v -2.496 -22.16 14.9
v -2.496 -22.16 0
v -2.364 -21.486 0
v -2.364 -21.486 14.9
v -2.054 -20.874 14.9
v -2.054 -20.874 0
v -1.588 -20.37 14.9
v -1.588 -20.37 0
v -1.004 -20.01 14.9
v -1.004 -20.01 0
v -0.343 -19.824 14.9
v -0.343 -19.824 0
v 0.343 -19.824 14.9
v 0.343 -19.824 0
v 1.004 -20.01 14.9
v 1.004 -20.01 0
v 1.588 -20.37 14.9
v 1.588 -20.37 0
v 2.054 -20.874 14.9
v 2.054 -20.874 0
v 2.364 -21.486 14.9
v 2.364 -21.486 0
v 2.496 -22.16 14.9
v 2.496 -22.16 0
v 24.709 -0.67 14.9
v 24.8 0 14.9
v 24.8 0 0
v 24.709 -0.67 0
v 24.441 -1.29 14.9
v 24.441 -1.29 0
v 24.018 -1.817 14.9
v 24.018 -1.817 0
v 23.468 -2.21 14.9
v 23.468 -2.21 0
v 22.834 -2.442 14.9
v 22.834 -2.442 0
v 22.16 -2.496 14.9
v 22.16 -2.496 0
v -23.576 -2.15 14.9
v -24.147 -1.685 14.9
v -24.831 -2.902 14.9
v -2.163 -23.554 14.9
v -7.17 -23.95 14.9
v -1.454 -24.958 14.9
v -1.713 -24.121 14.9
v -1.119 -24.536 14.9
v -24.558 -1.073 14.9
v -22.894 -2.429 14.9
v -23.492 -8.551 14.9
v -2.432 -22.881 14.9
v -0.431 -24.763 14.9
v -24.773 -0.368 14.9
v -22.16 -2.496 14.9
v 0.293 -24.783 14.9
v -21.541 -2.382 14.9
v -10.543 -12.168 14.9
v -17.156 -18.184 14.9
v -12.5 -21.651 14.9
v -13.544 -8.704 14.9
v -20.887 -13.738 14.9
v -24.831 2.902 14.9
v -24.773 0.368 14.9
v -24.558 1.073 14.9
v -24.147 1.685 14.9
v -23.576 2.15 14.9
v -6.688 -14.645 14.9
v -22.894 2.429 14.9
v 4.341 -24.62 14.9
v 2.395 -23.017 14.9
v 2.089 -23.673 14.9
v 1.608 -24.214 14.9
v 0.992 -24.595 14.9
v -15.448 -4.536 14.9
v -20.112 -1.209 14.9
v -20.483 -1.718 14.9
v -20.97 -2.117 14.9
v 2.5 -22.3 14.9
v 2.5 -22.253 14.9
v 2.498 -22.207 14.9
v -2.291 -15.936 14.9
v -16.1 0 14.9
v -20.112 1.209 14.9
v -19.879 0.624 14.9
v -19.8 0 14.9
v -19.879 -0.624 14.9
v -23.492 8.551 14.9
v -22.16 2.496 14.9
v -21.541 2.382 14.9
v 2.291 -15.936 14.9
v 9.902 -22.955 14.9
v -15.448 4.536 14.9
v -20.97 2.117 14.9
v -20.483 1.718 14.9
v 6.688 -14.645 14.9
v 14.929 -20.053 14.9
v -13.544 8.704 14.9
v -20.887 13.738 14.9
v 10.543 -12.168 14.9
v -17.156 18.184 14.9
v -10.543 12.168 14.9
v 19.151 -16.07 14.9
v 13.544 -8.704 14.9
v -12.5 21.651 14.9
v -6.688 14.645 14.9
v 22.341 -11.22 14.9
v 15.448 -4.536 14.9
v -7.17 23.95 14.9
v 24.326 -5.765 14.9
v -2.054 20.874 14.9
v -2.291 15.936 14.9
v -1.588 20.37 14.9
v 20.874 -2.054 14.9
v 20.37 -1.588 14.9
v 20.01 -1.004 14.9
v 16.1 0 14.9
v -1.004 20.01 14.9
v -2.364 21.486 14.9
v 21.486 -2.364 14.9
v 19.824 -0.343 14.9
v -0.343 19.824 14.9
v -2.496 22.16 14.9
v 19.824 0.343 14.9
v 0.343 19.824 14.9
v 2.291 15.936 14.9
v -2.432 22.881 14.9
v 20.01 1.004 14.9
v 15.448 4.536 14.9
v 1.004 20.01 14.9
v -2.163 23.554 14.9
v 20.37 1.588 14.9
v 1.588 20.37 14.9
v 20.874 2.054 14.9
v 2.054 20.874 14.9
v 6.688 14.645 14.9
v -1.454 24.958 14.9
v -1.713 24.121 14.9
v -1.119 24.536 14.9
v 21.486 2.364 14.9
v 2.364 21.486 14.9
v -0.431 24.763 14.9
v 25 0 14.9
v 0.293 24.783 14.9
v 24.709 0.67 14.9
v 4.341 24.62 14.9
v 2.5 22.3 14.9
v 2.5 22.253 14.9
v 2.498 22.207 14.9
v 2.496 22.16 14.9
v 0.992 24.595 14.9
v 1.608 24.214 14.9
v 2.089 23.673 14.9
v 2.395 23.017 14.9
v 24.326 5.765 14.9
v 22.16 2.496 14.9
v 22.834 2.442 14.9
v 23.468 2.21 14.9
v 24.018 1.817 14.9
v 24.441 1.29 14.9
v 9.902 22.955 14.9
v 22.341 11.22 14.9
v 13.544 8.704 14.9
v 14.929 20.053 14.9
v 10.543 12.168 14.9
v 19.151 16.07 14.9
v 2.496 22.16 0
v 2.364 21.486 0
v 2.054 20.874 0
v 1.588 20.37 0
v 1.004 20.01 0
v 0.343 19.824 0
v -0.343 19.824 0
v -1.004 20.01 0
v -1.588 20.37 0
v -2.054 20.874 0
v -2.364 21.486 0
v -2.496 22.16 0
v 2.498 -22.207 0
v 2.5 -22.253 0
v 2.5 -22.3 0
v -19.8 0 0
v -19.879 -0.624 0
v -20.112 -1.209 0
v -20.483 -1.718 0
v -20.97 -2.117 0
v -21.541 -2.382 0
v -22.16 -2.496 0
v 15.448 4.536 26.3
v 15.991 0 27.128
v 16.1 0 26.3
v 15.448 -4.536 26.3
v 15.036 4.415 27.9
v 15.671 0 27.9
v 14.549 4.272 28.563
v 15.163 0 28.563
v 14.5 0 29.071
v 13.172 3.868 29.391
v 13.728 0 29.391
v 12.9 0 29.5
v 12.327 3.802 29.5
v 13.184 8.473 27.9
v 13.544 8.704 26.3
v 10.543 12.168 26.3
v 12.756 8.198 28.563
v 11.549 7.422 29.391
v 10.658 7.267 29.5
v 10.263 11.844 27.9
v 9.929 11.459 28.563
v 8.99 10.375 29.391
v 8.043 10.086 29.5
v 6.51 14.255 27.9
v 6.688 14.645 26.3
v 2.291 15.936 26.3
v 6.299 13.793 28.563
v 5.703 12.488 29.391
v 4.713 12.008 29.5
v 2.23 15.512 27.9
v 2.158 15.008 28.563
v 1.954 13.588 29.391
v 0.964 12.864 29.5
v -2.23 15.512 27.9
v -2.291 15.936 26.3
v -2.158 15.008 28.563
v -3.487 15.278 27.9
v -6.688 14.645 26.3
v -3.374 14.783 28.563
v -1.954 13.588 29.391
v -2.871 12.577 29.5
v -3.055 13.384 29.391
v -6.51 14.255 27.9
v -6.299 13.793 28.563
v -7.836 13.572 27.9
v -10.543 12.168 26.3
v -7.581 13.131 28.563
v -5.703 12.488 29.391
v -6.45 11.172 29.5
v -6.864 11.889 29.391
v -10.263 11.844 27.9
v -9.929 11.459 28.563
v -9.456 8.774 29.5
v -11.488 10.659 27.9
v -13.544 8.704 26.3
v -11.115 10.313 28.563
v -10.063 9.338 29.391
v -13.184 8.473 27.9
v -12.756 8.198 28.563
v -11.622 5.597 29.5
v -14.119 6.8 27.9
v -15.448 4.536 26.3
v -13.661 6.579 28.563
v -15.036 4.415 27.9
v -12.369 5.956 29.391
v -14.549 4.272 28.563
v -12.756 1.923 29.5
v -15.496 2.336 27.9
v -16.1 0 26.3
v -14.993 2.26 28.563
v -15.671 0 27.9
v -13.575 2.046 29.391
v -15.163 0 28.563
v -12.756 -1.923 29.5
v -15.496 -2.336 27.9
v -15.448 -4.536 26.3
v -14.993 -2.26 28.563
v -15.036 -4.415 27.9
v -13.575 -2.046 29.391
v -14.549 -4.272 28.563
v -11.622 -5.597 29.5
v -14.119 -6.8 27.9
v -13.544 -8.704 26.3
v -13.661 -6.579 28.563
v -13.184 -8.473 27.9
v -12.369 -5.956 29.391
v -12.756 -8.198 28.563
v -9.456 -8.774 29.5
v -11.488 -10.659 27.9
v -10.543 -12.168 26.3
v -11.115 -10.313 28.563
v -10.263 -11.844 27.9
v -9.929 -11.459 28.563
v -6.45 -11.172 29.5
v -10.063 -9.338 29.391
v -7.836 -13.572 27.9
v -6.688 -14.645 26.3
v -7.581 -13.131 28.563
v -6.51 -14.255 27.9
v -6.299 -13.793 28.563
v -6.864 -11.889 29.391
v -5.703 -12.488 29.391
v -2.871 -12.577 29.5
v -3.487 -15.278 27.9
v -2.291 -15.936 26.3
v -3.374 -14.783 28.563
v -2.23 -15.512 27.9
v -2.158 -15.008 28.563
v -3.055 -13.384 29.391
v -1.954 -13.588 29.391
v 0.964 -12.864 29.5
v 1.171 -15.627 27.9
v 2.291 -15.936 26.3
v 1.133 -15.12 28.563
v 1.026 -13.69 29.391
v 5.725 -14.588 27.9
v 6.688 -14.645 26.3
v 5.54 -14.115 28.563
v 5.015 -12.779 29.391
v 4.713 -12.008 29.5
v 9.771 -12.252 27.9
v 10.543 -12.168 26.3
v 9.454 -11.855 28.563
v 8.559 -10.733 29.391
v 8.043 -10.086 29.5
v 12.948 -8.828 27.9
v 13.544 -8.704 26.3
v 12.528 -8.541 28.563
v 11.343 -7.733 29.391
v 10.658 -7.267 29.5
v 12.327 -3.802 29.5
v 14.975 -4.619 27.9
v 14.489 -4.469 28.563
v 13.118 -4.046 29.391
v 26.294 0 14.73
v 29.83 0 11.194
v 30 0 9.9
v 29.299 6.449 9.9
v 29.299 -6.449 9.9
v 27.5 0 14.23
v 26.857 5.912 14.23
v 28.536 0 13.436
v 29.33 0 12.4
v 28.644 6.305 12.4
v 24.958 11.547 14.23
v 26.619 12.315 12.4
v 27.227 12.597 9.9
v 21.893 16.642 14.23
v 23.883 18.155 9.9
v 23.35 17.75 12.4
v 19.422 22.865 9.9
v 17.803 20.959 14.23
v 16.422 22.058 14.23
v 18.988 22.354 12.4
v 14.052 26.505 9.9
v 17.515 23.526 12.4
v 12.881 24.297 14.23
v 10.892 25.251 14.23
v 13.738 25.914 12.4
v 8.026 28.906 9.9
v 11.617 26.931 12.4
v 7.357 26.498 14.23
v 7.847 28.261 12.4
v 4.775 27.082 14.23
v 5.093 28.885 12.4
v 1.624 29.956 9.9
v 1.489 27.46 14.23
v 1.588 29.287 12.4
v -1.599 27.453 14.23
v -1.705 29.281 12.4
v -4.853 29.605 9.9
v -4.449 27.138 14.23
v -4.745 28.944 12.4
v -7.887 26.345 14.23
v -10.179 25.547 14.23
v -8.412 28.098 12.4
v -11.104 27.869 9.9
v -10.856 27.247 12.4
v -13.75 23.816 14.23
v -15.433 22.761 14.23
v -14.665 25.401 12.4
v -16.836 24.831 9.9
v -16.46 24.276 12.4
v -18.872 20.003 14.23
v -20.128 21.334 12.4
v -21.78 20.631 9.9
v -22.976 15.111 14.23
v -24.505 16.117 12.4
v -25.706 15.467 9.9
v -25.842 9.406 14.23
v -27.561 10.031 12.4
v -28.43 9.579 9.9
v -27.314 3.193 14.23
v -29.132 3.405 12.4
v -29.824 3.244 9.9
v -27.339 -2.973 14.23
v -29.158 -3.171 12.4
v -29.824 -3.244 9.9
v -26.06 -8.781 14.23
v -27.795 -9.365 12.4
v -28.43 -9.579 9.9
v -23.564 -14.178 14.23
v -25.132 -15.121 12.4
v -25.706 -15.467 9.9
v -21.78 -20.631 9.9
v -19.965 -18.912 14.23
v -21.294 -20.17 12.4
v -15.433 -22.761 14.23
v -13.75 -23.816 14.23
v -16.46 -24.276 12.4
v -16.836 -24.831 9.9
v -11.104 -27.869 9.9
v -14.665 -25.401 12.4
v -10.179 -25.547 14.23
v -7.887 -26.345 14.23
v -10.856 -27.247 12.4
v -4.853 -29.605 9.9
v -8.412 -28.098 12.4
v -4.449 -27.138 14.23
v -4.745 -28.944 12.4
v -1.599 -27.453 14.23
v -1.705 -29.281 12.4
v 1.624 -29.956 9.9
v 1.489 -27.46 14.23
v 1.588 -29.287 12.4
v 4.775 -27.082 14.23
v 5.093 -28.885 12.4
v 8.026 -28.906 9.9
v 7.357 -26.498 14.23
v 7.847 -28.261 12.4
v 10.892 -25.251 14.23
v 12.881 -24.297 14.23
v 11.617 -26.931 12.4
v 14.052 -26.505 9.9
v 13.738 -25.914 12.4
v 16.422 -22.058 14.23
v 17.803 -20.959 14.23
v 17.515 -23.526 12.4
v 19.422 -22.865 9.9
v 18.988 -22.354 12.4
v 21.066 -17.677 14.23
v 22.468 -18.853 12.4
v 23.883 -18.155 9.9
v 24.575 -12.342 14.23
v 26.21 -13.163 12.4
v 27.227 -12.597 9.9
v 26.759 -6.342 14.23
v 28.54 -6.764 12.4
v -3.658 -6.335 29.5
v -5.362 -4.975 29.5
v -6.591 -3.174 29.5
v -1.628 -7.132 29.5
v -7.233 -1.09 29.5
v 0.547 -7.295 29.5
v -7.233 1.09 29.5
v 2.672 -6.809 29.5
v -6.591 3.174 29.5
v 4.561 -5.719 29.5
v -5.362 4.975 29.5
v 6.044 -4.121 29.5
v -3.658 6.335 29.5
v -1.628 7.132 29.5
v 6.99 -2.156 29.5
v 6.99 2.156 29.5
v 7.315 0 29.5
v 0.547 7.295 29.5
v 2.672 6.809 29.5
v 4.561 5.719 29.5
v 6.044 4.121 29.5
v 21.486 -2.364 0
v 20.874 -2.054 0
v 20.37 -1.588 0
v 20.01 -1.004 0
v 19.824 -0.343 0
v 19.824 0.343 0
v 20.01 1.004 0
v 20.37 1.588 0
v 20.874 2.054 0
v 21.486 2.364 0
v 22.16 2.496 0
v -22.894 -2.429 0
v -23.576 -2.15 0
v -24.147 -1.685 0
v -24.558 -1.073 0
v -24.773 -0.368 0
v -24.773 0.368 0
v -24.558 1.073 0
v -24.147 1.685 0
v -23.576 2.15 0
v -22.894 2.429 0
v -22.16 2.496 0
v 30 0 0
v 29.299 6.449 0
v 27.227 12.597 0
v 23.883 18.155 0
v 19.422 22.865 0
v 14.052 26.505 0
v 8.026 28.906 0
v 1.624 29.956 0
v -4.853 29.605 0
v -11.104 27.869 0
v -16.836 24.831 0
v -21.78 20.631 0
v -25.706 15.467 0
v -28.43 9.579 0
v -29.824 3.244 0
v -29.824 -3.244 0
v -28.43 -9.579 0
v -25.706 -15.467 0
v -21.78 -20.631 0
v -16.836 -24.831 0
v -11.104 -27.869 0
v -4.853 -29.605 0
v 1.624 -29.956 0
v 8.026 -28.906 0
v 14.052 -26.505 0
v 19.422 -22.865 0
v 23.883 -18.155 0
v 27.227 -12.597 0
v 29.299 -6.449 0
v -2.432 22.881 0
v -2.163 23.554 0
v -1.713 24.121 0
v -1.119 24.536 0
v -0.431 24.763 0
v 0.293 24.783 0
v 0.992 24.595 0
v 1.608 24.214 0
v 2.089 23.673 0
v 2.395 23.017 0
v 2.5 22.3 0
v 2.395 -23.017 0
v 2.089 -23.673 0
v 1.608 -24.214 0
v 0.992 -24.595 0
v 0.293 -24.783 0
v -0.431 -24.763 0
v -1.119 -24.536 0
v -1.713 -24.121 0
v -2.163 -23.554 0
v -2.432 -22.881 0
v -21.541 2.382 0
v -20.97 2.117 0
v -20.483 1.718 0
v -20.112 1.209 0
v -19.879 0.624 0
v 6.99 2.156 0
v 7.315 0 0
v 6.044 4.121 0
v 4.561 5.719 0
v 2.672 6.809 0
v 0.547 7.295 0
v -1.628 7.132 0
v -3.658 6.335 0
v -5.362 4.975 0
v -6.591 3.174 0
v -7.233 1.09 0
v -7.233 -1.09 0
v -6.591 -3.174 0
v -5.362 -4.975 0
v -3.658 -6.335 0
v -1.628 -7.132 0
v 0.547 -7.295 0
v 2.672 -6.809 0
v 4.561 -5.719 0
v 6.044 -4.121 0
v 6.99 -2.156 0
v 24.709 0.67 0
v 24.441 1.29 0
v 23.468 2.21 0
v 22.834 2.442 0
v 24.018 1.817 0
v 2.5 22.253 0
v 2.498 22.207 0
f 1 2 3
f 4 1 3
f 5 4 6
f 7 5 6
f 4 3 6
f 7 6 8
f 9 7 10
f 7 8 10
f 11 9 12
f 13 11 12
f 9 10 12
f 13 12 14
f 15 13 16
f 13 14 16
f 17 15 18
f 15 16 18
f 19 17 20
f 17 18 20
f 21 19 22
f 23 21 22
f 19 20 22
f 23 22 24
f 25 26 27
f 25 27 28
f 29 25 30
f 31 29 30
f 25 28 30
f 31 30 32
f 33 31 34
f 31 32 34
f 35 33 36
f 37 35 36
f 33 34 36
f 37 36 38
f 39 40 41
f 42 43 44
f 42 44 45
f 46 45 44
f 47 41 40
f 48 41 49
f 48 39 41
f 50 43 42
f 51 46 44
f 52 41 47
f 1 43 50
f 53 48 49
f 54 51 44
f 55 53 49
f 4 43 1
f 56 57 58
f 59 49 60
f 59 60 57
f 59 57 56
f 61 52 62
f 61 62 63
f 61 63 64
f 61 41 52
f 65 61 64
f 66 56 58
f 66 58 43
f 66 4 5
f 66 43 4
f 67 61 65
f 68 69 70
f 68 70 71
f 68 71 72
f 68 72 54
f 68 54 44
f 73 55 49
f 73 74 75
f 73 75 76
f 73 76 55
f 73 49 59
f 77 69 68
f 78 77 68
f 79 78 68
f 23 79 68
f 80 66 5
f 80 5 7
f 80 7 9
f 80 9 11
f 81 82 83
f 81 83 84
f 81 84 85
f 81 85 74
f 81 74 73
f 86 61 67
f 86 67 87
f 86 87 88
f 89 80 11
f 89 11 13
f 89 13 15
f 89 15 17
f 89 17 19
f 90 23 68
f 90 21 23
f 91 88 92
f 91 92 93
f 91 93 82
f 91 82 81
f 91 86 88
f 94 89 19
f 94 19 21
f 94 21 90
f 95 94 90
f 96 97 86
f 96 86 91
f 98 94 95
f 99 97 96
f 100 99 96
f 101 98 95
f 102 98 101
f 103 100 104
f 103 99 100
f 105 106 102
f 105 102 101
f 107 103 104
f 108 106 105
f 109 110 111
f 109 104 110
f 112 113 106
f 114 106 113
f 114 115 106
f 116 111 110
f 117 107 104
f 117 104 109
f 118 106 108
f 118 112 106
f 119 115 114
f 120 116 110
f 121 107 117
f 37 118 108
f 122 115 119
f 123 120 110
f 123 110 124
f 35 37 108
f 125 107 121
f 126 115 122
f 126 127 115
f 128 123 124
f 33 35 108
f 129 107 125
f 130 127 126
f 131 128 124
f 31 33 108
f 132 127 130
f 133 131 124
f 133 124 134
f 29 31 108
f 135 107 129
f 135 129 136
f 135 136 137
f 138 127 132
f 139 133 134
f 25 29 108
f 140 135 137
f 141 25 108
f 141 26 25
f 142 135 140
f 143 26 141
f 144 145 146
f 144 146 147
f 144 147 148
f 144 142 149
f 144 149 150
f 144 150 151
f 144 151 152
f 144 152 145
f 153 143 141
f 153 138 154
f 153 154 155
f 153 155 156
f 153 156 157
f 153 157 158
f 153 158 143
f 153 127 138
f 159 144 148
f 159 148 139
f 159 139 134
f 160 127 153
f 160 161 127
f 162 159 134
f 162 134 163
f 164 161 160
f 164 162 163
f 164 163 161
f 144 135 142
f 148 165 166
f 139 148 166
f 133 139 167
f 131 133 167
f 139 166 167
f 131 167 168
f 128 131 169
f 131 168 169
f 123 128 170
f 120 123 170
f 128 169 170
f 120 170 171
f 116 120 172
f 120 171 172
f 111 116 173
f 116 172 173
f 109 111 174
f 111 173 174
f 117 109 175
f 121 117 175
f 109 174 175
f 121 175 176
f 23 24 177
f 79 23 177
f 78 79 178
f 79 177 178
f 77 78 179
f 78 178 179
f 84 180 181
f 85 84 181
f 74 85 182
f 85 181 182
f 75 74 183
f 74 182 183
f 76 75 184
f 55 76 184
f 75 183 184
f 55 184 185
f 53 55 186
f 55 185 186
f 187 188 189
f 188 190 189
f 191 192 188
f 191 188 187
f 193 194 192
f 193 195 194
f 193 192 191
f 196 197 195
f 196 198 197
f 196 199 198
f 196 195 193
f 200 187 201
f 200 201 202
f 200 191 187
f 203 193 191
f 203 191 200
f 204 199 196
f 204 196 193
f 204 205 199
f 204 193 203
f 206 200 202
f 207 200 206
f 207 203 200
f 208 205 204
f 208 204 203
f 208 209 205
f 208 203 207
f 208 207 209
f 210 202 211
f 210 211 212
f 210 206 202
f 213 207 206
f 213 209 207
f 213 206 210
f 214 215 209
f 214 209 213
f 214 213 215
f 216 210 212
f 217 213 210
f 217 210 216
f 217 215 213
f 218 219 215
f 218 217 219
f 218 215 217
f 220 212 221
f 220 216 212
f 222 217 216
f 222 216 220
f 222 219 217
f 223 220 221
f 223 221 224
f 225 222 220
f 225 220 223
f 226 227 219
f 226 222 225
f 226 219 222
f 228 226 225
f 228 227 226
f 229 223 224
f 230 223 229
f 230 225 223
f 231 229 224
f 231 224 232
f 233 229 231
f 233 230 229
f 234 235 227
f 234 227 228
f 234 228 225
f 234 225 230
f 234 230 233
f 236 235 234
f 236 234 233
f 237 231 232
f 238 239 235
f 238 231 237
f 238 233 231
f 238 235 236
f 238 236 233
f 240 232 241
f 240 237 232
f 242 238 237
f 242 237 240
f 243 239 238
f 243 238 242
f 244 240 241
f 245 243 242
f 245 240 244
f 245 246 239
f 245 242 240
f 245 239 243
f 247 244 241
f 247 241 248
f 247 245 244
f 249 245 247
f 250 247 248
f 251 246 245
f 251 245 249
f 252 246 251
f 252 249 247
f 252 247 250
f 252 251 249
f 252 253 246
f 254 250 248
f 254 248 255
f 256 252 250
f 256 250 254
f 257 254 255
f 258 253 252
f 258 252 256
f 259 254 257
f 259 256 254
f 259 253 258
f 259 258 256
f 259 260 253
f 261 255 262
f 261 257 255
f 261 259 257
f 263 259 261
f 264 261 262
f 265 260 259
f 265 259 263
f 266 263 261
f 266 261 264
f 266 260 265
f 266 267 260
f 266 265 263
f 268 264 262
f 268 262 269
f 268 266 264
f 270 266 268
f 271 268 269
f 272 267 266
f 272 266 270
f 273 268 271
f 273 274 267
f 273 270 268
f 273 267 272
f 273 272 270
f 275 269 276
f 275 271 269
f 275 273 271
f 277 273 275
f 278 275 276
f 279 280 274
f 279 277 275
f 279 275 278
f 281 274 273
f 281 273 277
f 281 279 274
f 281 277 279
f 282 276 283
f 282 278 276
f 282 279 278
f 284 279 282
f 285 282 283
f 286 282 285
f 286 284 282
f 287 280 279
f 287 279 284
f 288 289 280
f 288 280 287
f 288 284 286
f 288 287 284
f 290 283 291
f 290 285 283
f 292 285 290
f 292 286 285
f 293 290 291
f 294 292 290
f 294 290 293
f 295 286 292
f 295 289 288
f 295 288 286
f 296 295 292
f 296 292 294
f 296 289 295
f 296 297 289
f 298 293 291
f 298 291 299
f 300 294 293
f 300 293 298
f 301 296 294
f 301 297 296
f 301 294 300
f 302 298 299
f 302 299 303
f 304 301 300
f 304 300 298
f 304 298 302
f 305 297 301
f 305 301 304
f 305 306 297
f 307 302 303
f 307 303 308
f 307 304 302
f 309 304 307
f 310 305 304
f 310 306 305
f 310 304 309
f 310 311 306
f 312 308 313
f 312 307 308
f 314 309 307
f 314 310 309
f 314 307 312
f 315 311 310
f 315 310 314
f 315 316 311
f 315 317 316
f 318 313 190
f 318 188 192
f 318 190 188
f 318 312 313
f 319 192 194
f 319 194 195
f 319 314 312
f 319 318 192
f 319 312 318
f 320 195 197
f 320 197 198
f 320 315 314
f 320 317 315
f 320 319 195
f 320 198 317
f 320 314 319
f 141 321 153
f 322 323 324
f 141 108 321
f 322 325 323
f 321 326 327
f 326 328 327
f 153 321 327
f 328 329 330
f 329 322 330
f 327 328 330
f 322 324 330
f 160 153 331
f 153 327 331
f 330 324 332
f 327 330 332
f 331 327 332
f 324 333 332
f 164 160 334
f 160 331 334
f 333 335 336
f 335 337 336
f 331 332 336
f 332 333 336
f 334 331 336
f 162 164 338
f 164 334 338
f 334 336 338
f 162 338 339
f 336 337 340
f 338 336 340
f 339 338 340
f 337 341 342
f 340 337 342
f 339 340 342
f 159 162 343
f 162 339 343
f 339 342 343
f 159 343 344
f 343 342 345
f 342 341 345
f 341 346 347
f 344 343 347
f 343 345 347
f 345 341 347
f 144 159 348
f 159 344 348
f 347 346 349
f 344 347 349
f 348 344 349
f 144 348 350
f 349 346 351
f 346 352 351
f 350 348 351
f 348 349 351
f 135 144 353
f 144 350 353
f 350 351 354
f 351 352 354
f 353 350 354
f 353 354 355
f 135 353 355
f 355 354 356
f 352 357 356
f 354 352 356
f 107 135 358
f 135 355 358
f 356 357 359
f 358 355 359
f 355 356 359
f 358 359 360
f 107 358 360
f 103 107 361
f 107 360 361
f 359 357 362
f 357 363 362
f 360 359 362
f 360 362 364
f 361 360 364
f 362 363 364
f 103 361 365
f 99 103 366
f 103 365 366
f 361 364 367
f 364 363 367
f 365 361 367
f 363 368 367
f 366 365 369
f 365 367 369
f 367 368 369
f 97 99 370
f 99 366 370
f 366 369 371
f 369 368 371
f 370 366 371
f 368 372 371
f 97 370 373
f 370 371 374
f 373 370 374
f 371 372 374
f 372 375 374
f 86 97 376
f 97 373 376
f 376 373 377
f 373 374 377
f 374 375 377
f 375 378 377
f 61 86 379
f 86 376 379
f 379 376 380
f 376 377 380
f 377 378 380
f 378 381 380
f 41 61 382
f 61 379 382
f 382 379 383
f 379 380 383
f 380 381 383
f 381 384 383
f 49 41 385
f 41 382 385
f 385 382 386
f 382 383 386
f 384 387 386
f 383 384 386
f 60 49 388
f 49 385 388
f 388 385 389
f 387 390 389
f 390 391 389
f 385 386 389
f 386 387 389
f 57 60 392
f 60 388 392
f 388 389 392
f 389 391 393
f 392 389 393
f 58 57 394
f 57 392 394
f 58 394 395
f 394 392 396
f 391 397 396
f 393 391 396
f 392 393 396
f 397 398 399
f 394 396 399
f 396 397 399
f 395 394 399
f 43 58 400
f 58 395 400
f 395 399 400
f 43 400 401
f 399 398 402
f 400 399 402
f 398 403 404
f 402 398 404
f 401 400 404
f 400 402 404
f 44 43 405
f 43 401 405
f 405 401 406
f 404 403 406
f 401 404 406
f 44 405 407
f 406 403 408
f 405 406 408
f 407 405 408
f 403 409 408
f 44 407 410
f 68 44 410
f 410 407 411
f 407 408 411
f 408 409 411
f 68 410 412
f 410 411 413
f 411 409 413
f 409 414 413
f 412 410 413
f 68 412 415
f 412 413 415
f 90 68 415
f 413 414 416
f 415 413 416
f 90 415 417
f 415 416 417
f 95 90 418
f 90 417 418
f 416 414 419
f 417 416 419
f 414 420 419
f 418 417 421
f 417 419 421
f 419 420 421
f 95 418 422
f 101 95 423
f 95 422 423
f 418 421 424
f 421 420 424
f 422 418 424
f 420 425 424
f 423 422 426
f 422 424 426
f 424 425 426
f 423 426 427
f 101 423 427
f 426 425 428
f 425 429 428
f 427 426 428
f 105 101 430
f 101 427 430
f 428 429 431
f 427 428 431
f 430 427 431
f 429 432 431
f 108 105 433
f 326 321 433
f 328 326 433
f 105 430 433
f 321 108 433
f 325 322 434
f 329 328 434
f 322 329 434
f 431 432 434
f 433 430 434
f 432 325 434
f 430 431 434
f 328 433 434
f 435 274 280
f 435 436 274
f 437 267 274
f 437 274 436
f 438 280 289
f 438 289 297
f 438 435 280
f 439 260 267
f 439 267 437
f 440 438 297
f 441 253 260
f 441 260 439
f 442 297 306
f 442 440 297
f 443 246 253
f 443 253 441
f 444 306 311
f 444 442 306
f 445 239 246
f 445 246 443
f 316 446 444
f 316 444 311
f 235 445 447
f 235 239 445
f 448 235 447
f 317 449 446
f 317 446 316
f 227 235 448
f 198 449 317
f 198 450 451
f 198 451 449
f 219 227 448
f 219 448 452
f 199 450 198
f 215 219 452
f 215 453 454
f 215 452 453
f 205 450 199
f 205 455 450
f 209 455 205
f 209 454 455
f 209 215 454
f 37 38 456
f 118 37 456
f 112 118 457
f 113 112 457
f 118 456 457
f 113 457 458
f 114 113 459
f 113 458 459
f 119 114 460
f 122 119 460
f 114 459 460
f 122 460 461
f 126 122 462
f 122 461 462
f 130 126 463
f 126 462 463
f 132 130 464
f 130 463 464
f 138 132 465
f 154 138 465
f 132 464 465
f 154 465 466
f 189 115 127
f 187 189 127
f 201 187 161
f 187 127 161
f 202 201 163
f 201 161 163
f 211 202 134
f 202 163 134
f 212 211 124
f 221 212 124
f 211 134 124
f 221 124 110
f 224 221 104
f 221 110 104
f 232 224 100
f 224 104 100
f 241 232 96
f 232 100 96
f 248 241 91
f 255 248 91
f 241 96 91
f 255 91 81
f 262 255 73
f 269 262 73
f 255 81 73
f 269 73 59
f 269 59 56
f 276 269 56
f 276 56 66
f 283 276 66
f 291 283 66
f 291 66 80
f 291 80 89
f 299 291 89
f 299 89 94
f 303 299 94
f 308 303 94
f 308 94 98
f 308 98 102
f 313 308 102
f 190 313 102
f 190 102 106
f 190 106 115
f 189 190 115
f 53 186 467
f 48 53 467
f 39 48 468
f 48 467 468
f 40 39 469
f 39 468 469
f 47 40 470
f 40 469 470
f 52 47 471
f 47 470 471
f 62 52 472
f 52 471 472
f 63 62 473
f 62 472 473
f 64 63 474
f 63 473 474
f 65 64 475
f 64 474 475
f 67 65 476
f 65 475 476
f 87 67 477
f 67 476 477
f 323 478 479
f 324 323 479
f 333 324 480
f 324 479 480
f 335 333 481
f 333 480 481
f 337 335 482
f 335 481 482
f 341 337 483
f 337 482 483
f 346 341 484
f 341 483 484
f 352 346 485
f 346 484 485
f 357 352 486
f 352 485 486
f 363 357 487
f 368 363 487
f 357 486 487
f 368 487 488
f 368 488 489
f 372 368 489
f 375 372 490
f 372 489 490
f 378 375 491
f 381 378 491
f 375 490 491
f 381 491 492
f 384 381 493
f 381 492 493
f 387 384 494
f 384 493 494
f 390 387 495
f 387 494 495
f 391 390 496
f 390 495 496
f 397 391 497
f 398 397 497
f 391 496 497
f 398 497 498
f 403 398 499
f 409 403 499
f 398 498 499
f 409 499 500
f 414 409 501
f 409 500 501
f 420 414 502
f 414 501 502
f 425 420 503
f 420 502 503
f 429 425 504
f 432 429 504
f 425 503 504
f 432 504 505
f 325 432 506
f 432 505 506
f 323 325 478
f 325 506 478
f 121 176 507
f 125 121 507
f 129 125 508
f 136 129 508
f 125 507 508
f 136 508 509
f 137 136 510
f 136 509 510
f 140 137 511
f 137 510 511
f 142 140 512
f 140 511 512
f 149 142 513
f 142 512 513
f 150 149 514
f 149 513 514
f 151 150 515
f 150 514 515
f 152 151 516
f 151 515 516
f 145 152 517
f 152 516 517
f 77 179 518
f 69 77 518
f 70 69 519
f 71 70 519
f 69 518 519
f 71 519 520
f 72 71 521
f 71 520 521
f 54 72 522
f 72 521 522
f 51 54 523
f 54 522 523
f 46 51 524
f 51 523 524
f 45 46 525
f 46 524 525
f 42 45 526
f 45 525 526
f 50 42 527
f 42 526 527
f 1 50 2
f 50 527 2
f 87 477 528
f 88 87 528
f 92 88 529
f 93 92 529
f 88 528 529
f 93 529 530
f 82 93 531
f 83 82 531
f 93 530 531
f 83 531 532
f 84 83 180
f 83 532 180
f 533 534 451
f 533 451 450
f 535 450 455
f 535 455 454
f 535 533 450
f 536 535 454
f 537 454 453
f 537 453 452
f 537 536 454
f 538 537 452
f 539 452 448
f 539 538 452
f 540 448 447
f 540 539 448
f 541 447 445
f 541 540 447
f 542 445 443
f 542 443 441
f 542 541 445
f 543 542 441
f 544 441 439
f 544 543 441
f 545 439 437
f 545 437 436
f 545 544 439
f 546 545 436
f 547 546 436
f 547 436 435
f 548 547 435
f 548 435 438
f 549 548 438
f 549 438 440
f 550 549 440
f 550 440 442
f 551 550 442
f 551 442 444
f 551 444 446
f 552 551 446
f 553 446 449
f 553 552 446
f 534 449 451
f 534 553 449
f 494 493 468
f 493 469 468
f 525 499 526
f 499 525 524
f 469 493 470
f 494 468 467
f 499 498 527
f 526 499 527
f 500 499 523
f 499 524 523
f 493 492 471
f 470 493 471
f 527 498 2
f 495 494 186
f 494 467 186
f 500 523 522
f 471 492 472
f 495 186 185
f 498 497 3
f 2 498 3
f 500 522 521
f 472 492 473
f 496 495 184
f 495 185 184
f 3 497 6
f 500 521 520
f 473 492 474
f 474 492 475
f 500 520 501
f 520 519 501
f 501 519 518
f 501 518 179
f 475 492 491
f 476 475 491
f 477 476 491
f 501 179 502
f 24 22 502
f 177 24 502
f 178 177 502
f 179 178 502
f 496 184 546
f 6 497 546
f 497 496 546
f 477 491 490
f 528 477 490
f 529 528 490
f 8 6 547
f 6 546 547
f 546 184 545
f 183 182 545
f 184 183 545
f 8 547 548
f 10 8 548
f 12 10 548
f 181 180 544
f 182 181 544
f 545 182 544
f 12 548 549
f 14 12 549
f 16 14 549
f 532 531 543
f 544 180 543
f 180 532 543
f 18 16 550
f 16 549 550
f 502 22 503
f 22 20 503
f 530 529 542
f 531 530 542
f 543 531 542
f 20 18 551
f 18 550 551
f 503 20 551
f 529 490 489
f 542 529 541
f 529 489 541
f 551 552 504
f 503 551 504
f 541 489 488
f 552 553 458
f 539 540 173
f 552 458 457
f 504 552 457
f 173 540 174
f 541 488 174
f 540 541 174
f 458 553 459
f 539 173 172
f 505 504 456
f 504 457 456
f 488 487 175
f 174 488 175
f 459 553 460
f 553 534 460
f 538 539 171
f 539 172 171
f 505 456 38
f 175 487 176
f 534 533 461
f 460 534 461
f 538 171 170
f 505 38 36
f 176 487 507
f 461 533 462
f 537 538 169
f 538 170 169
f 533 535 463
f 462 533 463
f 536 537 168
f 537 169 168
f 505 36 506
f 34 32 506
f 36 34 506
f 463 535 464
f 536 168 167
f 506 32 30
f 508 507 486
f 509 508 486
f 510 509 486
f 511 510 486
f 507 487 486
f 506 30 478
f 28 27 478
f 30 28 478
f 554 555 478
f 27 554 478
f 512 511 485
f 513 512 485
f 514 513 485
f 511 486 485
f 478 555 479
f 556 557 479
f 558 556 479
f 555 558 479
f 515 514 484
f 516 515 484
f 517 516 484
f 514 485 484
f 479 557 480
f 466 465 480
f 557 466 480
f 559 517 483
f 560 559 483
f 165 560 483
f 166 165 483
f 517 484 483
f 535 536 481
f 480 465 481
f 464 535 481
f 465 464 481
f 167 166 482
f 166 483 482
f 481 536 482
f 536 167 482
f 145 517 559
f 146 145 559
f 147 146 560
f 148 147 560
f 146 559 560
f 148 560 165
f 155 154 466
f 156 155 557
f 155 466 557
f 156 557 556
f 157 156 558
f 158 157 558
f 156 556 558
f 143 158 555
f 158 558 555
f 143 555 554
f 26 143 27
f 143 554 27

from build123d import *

# Parameters (mm, degrees)
F0_R     = 30
F0_R_2   = 16.1
F1_DEPTH = 14.9
F0_R_3   = 7.315
F2_DEPTH = 29.5
F3_R     = 5
F4_R     = 3.2


with BuildPart() as f1:
    # F0 (on Top) → F1 (new body)
    with BuildSketch(Plane.XY):
        Circle(F0_R)
        with BuildLine():
            ThreePointArc((-22.159865, -2.496069), (-24.8, 0), (-22.159865, 2.496069))
            ThreePointArc((-22.159865, 2.496069), (-15.768481, 15.768481), (-2.496069, 22.159865))
            ThreePointArc((-2.496069, 22.159865), (-0.070095, 24.799017), (2.5, 22.3))
            ThreePointArc((2.5, 22.3), (2.499017, 22.229905), (2.496069, 22.159865))
            ThreePointArc((2.496069, 22.159865), (15.768481, 15.768481), (22.159865, 2.496069))
            ThreePointArc((22.159865, 2.496069), (24.017507, 1.816636), (24.8, 0))
            ThreePointArc((24.8, 0), (24.017507, -1.816636), (22.159865, -2.496069))
            ThreePointArc((22.159865, -2.496069), (15.768481, -15.768481), (2.496069, -22.159865))
            ThreePointArc((2.496069, -22.159865), (2.499017, -22.229905), (2.5, -22.3))
            ThreePointArc((2.5, -22.3), (-0.070095, -24.799017), (-2.496069, -22.159865))
            ThreePointArc((-2.496069, -22.159865), (-15.768481, -15.768481), (-22.159865, -2.496069))
        make_face(mode=Mode.SUBTRACT)
        with BuildLine():
            ThreePointArc((-22.159865, 2.496069), (-20.483364, 1.717507), (-19.8, 0))
            ThreePointArc((-19.8, 0), (-20.483364, -1.717507), (-22.159865, -2.496069))
            ThreePointArc((-22.159865, -2.496069), (-15.768481, -15.768481), (-2.496069, -22.159865))
            ThreePointArc((-2.496069, -22.159865), (0, -19.8), (2.496069, -22.159865))
            ThreePointArc((2.496069, -22.159865), (15.768481, -15.768481), (22.159865, -2.496069))
            ThreePointArc((22.159865, -2.496069), (19.8, 0), (22.159865, 2.496069))
            ThreePointArc((22.159865, 2.496069), (15.768481, 15.768481), (2.496069, 22.159865))
            ThreePointArc((2.496069, 22.159865), (0, 19.8), (-2.496069, 22.159865))
            ThreePointArc((-2.496069, 22.159865), (-15.768481, 15.768481), (-22.159865, 2.496069))
        make_face()
        Circle(F0_R_2, mode=Mode.SUBTRACT)
    extrude(amount=F1_DEPTH)

    # F0 (on Top) → F2 (join)
    with BuildSketch(Plane.XY):
        Circle(F0_R_2)
        Circle(F0_R_3, mode=Mode.SUBTRACT)
    extrude(amount=F2_DEPTH)

    # F3
    f3_edges = [f1.edges().sort_by_distance(p)[0] for p in [
        (-30, 0, 14.9),
    ]]
    fillet(f3_edges, radius=F3_R)

    # F4
    f4_edges = [f1.edges().sort_by_distance(p)[0] for p in [
        (-16.1, 0, 29.5),
    ]]
    fillet(f4_edges, radius=F4_R)


solid = f1.part
